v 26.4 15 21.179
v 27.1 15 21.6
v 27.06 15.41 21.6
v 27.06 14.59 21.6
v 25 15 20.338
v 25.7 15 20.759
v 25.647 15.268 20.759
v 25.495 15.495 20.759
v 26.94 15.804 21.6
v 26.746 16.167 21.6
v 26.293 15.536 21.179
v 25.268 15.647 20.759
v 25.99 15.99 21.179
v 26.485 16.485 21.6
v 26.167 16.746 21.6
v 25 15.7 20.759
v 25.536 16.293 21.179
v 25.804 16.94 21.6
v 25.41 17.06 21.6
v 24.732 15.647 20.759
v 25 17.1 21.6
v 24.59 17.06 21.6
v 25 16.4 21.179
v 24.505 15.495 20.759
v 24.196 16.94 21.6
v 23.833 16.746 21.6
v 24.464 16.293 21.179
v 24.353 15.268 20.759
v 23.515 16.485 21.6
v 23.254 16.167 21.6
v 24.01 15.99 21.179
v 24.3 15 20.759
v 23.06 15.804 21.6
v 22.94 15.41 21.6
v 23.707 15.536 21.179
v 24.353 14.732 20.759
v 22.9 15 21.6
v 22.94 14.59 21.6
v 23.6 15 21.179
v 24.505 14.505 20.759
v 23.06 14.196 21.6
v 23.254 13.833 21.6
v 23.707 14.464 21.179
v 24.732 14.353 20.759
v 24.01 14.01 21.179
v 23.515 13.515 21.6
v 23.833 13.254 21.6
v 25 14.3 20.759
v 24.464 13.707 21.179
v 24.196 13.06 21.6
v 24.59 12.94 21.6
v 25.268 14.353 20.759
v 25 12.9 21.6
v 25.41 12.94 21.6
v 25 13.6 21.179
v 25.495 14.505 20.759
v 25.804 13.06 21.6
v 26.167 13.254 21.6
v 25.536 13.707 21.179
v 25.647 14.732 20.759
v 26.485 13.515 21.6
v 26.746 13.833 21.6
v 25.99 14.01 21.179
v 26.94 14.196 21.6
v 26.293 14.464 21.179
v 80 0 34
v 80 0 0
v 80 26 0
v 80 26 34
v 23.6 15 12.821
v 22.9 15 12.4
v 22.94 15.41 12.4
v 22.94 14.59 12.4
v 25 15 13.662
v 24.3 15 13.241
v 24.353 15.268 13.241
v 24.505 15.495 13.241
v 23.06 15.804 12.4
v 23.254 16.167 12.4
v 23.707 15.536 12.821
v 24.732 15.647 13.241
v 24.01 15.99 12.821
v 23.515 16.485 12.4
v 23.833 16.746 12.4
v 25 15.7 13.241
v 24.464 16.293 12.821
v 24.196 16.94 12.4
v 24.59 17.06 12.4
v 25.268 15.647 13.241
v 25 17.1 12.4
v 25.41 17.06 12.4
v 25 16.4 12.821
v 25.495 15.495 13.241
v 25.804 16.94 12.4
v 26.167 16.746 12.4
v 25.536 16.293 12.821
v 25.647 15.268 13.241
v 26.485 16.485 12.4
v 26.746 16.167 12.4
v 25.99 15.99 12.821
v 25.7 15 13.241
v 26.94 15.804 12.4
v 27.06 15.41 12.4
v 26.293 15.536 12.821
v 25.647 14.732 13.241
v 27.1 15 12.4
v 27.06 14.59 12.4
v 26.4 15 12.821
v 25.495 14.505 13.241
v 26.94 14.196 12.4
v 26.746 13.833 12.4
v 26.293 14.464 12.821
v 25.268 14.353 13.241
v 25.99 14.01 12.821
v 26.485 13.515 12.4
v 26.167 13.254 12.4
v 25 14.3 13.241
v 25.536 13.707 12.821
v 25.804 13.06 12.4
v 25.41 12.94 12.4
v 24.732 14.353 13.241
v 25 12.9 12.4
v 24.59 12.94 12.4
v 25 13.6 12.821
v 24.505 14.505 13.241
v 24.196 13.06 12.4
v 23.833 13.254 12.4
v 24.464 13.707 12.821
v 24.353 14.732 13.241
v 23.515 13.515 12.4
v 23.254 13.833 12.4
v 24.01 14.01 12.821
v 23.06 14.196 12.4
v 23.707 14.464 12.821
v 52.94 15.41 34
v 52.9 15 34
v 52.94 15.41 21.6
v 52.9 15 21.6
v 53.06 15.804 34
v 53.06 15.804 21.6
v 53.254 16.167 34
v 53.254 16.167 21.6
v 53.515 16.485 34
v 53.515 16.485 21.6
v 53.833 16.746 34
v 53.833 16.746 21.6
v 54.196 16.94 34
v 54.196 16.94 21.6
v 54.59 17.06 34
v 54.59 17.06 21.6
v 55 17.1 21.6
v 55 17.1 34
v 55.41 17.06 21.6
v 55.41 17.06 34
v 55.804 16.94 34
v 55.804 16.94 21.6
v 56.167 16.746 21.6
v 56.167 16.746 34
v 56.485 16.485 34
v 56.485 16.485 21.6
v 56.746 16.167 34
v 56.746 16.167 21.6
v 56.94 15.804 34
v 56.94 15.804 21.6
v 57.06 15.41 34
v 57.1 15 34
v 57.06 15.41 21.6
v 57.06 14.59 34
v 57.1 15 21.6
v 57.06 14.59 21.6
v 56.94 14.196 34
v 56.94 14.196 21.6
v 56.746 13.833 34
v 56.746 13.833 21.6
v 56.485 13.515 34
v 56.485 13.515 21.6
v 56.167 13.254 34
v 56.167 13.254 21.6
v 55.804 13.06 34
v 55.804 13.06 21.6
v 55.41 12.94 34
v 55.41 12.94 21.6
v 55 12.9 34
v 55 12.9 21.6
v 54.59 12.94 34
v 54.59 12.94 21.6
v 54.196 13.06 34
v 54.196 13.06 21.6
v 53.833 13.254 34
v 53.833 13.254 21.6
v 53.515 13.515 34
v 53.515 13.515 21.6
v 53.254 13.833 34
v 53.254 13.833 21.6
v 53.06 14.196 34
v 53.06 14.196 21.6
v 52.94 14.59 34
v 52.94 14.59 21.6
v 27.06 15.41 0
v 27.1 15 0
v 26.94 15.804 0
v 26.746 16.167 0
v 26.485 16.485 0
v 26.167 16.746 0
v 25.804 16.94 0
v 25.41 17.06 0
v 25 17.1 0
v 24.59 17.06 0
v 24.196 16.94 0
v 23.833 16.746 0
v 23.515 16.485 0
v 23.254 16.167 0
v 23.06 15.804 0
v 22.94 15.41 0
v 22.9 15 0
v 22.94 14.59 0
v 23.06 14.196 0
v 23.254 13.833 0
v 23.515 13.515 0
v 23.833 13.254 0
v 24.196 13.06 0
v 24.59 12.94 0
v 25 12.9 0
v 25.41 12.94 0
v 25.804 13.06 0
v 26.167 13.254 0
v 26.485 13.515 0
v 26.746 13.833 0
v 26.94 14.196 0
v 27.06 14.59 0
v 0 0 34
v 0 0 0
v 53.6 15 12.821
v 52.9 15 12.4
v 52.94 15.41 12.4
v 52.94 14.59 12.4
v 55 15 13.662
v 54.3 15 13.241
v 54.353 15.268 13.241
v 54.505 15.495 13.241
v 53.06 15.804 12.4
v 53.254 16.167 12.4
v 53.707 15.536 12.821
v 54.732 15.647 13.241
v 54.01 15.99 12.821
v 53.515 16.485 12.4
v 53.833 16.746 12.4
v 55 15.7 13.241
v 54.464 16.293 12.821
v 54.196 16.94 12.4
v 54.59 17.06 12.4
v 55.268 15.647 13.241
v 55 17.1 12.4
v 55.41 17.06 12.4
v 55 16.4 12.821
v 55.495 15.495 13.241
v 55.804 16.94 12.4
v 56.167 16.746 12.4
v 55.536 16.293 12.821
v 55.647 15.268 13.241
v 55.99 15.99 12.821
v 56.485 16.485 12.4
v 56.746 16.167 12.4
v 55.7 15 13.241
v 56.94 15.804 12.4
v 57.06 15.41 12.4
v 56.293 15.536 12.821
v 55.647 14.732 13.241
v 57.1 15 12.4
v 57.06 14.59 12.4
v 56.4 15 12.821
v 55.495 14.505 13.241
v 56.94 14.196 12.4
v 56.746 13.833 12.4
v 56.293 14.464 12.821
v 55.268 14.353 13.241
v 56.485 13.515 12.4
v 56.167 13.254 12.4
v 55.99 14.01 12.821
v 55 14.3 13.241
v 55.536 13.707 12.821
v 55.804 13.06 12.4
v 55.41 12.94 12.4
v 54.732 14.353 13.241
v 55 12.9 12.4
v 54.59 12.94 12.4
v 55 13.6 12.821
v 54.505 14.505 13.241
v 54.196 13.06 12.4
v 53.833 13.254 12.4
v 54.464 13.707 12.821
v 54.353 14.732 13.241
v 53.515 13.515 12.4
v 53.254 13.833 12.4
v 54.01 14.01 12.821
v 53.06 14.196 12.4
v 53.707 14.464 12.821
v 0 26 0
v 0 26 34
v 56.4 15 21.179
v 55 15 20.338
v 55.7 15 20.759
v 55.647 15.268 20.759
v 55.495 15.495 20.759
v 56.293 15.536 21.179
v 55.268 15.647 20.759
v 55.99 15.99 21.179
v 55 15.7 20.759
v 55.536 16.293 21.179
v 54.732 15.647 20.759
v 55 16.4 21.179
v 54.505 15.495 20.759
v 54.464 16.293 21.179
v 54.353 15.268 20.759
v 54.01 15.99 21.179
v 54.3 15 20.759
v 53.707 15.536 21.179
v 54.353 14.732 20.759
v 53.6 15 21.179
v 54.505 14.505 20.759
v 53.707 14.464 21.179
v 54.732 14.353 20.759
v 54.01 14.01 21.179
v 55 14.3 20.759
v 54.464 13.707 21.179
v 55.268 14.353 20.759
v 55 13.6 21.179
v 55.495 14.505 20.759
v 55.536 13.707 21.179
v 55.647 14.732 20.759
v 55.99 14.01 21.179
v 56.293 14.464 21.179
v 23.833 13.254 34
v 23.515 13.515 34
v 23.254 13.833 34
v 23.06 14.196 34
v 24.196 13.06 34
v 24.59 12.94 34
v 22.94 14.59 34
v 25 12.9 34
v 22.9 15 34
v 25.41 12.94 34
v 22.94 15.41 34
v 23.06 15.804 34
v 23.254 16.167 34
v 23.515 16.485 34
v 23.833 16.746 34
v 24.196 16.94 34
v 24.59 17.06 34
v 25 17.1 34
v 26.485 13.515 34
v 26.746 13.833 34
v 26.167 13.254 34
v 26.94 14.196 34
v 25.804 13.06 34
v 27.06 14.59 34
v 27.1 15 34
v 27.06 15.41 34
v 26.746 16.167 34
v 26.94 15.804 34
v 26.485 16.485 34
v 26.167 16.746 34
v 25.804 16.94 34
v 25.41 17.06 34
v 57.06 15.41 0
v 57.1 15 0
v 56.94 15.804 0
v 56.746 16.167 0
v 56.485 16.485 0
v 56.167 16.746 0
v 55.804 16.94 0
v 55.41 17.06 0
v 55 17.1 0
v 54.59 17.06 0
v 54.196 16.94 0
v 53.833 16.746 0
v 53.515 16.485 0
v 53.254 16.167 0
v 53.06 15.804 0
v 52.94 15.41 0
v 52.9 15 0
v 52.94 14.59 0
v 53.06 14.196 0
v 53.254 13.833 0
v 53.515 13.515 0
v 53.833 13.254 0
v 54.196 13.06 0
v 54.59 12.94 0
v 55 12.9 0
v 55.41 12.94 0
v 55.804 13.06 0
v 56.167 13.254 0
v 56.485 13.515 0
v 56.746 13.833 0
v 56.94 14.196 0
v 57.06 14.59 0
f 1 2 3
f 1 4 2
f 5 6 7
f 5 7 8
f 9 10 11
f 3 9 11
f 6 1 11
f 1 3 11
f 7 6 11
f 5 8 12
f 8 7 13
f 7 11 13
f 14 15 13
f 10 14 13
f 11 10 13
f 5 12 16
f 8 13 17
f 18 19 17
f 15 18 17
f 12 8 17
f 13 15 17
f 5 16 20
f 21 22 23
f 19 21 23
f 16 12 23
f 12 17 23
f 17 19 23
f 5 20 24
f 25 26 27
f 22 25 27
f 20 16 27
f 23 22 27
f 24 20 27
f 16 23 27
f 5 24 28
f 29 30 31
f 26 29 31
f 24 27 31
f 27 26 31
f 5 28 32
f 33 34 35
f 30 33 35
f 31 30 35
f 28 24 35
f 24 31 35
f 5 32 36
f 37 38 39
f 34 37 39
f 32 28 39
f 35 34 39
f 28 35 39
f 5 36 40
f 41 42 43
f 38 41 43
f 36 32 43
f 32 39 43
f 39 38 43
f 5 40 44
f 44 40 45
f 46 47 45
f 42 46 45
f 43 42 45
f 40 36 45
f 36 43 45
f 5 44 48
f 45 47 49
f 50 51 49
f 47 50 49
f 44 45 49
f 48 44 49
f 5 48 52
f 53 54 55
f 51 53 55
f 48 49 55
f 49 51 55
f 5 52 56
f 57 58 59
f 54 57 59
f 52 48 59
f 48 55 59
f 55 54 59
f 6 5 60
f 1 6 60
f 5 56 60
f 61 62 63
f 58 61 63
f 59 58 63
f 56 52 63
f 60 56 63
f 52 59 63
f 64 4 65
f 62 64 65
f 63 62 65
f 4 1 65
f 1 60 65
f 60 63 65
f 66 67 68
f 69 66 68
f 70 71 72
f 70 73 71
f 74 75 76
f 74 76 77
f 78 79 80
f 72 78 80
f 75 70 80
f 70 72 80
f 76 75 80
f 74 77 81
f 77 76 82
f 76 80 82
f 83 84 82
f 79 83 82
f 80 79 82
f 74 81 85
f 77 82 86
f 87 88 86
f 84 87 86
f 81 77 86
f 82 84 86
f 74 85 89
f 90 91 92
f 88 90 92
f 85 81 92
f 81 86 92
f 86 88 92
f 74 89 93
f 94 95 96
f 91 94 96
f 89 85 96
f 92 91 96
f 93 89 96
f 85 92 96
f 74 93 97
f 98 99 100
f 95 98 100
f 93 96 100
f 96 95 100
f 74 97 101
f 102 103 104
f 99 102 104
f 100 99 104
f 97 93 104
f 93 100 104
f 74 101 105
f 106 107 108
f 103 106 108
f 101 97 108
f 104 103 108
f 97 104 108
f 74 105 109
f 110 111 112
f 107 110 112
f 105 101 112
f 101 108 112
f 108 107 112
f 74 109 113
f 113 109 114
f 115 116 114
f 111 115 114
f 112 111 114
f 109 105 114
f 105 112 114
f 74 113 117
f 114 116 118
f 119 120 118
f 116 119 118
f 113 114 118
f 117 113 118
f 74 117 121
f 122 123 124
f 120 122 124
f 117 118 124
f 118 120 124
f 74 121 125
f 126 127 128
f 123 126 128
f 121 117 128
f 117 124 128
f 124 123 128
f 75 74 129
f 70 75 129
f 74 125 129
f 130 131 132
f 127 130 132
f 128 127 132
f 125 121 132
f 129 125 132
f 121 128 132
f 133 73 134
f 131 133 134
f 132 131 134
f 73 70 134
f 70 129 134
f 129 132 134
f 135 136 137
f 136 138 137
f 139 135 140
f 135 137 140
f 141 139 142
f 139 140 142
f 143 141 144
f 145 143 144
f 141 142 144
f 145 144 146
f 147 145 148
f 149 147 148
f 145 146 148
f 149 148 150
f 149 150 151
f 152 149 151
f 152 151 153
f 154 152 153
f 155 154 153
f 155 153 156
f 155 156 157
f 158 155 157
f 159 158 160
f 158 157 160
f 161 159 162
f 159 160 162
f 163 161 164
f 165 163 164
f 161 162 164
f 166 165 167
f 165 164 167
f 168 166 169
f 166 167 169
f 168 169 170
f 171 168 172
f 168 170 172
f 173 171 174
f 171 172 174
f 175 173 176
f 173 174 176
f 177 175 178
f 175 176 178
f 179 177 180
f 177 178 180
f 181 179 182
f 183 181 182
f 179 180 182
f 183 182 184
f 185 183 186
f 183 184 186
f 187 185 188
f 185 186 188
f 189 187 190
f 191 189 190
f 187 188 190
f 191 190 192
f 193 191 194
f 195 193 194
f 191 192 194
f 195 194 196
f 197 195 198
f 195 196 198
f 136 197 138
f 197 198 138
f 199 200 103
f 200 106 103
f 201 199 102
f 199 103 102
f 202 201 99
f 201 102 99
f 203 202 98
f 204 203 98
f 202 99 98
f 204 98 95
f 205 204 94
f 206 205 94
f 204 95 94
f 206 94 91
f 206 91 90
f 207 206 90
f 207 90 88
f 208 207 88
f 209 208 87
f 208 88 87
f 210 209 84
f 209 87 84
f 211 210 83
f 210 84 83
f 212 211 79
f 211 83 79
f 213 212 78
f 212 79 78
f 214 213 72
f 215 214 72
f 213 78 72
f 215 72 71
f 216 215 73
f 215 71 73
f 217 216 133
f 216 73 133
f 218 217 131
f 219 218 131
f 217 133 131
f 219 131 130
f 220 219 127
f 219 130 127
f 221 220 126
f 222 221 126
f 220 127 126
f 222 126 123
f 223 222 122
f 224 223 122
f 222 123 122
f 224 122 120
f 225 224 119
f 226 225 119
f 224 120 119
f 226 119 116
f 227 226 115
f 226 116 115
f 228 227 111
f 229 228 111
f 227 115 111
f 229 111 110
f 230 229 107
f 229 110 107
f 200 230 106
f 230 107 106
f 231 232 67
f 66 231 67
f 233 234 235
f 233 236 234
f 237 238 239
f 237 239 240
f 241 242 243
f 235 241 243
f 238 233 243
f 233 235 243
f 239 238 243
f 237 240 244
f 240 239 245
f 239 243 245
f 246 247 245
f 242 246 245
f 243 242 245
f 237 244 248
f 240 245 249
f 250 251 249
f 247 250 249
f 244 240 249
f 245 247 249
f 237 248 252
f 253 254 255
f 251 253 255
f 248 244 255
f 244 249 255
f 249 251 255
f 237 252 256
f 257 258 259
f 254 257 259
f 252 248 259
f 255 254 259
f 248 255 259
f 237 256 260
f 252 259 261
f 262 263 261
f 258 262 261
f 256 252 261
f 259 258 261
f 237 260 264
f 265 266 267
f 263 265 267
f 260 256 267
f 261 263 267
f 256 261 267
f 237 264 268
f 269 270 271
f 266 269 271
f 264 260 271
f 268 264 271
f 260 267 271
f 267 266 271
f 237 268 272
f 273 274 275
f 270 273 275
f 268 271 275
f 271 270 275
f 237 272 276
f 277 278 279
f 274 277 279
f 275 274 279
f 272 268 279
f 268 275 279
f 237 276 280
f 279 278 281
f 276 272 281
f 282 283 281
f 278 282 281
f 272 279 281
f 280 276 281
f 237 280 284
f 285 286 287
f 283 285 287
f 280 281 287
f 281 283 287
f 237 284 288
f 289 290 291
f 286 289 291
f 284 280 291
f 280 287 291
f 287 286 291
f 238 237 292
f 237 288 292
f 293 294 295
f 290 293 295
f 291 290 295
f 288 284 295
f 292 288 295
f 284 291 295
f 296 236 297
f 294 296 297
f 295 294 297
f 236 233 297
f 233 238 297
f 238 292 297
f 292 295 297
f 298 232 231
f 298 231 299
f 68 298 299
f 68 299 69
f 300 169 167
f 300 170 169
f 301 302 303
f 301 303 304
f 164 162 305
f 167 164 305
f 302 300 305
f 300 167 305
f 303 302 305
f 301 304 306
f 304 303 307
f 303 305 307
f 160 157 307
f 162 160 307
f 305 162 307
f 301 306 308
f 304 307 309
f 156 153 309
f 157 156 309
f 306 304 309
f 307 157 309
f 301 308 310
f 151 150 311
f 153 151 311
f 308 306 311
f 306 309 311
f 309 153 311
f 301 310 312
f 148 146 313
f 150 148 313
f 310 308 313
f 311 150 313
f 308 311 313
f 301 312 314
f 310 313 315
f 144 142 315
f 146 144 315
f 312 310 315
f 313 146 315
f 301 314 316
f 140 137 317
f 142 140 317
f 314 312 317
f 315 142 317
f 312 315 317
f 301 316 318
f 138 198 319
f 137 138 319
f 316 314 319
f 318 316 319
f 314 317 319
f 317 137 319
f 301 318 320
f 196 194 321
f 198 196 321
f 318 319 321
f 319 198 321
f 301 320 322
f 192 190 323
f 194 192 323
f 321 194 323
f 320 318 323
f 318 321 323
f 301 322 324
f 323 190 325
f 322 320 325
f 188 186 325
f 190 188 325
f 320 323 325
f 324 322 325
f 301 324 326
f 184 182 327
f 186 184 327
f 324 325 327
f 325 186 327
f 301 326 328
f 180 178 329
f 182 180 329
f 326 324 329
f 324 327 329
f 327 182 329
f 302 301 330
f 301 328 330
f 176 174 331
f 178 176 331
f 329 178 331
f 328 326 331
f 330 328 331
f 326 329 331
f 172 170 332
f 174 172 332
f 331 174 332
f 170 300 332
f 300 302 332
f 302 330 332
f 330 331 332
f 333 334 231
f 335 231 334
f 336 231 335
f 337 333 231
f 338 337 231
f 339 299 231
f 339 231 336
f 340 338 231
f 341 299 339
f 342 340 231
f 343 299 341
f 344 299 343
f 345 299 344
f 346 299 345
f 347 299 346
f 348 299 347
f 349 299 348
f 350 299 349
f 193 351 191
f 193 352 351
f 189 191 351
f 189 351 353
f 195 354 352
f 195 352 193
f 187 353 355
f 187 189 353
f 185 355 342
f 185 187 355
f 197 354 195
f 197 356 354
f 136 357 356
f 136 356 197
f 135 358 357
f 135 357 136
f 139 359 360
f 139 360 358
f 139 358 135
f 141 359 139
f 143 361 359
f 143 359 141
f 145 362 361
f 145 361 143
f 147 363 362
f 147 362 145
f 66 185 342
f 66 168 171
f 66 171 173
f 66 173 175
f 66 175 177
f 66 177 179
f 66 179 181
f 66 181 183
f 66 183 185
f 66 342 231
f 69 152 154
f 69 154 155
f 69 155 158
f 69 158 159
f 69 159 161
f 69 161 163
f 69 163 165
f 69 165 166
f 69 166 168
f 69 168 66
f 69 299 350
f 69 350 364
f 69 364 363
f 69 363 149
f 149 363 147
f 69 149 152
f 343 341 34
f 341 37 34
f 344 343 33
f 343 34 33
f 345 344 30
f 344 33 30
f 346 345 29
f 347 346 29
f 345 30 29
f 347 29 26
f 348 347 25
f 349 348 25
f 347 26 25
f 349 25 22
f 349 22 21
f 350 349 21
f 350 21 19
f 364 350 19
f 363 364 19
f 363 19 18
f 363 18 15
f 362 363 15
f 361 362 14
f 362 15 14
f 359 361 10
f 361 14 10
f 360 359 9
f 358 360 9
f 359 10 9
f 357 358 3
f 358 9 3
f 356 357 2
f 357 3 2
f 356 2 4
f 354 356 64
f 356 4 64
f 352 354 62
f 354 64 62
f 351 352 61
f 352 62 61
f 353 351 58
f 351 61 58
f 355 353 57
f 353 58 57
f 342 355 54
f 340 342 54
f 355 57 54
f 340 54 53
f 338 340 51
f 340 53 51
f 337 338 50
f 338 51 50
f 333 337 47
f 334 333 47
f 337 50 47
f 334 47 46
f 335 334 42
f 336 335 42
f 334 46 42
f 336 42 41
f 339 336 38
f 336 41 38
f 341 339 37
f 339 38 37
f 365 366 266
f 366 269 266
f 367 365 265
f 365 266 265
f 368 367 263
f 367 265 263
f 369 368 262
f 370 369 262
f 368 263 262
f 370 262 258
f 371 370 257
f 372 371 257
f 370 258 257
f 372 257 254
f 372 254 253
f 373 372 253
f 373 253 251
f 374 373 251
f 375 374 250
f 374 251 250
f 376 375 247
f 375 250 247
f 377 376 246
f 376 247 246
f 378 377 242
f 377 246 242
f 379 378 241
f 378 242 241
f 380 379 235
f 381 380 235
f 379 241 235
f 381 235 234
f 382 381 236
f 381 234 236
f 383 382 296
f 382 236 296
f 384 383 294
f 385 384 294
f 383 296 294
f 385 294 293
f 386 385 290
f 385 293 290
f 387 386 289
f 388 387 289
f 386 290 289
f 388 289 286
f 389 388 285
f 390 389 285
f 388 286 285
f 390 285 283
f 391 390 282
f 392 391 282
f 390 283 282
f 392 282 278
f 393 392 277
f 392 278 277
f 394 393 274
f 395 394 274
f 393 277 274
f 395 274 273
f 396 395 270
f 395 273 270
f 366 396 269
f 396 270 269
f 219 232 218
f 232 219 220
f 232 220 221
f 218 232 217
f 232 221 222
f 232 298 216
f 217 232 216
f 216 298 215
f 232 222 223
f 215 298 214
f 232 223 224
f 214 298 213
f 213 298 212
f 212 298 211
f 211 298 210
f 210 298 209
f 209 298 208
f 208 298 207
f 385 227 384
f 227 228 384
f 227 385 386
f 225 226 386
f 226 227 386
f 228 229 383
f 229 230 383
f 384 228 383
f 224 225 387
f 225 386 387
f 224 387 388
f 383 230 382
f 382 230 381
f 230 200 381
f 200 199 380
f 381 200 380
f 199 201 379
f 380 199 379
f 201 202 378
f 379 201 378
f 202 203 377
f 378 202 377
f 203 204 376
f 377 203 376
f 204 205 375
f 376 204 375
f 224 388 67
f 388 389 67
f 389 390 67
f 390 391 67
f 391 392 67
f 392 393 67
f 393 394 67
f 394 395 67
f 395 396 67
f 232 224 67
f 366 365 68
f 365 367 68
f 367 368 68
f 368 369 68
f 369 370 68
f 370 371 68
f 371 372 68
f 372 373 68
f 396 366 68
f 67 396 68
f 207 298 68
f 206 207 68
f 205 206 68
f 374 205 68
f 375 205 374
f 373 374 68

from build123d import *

# Parameters (mm, degrees)
SKETCH_1_W             = 80
SKETCH_1_H             = 26
EXTRUDE_1_DEPTH        = 34
HOLE_WIZARD_M5_1_D     = 4.2
HOLE_WIZARD_M5_1_DEPTH = 12.4
HOLE_WIZARD_M5_1_TIP   = 1.2618073
HOLE_WIZARD_M5_2_D     = 4.2
HOLE_WIZARD_M5_2_DEPTH = 12.4
HOLE_WIZARD_M5_2_TIP   = 1.2618073


with BuildPart() as part:
    # 草图1 → 凸台-拉伸1 (new body)
    with BuildSketch(Plane.XY):
        with Locations((40, 13)):
            Rectangle(SKETCH_1_W, SKETCH_1_H)
    extrude(amount=EXTRUDE_1_DEPTH)

    # M5 螺纹孔1
    with Locations(Plane(origin=(0, 0, 0), x_dir=(-1, 0, 0), z_dir=(0, 0, -1))):
        with Locations((-55, 15), (-25, 15)):
            Hole(HOLE_WIZARD_M5_1_D / 2, depth=HOLE_WIZARD_M5_1_DEPTH)
            with Locations((0, 0, -(HOLE_WIZARD_M5_1_DEPTH + HOLE_WIZARD_M5_1_TIP / 2))):  # 118° drill point
                Cone(0, HOLE_WIZARD_M5_1_D / 2, HOLE_WIZARD_M5_1_TIP, mode=Mode.SUBTRACT)

    # M5 螺纹孔2
    with Locations(Plane.XY.offset(34)):
        with Locations((25, 15), (55, 15)):
            Hole(HOLE_WIZARD_M5_2_D / 2, depth=HOLE_WIZARD_M5_2_DEPTH)
            with Locations((0, 0, -(HOLE_WIZARD_M5_2_DEPTH + HOLE_WIZARD_M5_2_TIP / 2))):  # 118° drill point
                Cone(0, HOLE_WIZARD_M5_2_D / 2, HOLE_WIZARD_M5_2_TIP, mode=Mode.SUBTRACT)


solid = part.part
